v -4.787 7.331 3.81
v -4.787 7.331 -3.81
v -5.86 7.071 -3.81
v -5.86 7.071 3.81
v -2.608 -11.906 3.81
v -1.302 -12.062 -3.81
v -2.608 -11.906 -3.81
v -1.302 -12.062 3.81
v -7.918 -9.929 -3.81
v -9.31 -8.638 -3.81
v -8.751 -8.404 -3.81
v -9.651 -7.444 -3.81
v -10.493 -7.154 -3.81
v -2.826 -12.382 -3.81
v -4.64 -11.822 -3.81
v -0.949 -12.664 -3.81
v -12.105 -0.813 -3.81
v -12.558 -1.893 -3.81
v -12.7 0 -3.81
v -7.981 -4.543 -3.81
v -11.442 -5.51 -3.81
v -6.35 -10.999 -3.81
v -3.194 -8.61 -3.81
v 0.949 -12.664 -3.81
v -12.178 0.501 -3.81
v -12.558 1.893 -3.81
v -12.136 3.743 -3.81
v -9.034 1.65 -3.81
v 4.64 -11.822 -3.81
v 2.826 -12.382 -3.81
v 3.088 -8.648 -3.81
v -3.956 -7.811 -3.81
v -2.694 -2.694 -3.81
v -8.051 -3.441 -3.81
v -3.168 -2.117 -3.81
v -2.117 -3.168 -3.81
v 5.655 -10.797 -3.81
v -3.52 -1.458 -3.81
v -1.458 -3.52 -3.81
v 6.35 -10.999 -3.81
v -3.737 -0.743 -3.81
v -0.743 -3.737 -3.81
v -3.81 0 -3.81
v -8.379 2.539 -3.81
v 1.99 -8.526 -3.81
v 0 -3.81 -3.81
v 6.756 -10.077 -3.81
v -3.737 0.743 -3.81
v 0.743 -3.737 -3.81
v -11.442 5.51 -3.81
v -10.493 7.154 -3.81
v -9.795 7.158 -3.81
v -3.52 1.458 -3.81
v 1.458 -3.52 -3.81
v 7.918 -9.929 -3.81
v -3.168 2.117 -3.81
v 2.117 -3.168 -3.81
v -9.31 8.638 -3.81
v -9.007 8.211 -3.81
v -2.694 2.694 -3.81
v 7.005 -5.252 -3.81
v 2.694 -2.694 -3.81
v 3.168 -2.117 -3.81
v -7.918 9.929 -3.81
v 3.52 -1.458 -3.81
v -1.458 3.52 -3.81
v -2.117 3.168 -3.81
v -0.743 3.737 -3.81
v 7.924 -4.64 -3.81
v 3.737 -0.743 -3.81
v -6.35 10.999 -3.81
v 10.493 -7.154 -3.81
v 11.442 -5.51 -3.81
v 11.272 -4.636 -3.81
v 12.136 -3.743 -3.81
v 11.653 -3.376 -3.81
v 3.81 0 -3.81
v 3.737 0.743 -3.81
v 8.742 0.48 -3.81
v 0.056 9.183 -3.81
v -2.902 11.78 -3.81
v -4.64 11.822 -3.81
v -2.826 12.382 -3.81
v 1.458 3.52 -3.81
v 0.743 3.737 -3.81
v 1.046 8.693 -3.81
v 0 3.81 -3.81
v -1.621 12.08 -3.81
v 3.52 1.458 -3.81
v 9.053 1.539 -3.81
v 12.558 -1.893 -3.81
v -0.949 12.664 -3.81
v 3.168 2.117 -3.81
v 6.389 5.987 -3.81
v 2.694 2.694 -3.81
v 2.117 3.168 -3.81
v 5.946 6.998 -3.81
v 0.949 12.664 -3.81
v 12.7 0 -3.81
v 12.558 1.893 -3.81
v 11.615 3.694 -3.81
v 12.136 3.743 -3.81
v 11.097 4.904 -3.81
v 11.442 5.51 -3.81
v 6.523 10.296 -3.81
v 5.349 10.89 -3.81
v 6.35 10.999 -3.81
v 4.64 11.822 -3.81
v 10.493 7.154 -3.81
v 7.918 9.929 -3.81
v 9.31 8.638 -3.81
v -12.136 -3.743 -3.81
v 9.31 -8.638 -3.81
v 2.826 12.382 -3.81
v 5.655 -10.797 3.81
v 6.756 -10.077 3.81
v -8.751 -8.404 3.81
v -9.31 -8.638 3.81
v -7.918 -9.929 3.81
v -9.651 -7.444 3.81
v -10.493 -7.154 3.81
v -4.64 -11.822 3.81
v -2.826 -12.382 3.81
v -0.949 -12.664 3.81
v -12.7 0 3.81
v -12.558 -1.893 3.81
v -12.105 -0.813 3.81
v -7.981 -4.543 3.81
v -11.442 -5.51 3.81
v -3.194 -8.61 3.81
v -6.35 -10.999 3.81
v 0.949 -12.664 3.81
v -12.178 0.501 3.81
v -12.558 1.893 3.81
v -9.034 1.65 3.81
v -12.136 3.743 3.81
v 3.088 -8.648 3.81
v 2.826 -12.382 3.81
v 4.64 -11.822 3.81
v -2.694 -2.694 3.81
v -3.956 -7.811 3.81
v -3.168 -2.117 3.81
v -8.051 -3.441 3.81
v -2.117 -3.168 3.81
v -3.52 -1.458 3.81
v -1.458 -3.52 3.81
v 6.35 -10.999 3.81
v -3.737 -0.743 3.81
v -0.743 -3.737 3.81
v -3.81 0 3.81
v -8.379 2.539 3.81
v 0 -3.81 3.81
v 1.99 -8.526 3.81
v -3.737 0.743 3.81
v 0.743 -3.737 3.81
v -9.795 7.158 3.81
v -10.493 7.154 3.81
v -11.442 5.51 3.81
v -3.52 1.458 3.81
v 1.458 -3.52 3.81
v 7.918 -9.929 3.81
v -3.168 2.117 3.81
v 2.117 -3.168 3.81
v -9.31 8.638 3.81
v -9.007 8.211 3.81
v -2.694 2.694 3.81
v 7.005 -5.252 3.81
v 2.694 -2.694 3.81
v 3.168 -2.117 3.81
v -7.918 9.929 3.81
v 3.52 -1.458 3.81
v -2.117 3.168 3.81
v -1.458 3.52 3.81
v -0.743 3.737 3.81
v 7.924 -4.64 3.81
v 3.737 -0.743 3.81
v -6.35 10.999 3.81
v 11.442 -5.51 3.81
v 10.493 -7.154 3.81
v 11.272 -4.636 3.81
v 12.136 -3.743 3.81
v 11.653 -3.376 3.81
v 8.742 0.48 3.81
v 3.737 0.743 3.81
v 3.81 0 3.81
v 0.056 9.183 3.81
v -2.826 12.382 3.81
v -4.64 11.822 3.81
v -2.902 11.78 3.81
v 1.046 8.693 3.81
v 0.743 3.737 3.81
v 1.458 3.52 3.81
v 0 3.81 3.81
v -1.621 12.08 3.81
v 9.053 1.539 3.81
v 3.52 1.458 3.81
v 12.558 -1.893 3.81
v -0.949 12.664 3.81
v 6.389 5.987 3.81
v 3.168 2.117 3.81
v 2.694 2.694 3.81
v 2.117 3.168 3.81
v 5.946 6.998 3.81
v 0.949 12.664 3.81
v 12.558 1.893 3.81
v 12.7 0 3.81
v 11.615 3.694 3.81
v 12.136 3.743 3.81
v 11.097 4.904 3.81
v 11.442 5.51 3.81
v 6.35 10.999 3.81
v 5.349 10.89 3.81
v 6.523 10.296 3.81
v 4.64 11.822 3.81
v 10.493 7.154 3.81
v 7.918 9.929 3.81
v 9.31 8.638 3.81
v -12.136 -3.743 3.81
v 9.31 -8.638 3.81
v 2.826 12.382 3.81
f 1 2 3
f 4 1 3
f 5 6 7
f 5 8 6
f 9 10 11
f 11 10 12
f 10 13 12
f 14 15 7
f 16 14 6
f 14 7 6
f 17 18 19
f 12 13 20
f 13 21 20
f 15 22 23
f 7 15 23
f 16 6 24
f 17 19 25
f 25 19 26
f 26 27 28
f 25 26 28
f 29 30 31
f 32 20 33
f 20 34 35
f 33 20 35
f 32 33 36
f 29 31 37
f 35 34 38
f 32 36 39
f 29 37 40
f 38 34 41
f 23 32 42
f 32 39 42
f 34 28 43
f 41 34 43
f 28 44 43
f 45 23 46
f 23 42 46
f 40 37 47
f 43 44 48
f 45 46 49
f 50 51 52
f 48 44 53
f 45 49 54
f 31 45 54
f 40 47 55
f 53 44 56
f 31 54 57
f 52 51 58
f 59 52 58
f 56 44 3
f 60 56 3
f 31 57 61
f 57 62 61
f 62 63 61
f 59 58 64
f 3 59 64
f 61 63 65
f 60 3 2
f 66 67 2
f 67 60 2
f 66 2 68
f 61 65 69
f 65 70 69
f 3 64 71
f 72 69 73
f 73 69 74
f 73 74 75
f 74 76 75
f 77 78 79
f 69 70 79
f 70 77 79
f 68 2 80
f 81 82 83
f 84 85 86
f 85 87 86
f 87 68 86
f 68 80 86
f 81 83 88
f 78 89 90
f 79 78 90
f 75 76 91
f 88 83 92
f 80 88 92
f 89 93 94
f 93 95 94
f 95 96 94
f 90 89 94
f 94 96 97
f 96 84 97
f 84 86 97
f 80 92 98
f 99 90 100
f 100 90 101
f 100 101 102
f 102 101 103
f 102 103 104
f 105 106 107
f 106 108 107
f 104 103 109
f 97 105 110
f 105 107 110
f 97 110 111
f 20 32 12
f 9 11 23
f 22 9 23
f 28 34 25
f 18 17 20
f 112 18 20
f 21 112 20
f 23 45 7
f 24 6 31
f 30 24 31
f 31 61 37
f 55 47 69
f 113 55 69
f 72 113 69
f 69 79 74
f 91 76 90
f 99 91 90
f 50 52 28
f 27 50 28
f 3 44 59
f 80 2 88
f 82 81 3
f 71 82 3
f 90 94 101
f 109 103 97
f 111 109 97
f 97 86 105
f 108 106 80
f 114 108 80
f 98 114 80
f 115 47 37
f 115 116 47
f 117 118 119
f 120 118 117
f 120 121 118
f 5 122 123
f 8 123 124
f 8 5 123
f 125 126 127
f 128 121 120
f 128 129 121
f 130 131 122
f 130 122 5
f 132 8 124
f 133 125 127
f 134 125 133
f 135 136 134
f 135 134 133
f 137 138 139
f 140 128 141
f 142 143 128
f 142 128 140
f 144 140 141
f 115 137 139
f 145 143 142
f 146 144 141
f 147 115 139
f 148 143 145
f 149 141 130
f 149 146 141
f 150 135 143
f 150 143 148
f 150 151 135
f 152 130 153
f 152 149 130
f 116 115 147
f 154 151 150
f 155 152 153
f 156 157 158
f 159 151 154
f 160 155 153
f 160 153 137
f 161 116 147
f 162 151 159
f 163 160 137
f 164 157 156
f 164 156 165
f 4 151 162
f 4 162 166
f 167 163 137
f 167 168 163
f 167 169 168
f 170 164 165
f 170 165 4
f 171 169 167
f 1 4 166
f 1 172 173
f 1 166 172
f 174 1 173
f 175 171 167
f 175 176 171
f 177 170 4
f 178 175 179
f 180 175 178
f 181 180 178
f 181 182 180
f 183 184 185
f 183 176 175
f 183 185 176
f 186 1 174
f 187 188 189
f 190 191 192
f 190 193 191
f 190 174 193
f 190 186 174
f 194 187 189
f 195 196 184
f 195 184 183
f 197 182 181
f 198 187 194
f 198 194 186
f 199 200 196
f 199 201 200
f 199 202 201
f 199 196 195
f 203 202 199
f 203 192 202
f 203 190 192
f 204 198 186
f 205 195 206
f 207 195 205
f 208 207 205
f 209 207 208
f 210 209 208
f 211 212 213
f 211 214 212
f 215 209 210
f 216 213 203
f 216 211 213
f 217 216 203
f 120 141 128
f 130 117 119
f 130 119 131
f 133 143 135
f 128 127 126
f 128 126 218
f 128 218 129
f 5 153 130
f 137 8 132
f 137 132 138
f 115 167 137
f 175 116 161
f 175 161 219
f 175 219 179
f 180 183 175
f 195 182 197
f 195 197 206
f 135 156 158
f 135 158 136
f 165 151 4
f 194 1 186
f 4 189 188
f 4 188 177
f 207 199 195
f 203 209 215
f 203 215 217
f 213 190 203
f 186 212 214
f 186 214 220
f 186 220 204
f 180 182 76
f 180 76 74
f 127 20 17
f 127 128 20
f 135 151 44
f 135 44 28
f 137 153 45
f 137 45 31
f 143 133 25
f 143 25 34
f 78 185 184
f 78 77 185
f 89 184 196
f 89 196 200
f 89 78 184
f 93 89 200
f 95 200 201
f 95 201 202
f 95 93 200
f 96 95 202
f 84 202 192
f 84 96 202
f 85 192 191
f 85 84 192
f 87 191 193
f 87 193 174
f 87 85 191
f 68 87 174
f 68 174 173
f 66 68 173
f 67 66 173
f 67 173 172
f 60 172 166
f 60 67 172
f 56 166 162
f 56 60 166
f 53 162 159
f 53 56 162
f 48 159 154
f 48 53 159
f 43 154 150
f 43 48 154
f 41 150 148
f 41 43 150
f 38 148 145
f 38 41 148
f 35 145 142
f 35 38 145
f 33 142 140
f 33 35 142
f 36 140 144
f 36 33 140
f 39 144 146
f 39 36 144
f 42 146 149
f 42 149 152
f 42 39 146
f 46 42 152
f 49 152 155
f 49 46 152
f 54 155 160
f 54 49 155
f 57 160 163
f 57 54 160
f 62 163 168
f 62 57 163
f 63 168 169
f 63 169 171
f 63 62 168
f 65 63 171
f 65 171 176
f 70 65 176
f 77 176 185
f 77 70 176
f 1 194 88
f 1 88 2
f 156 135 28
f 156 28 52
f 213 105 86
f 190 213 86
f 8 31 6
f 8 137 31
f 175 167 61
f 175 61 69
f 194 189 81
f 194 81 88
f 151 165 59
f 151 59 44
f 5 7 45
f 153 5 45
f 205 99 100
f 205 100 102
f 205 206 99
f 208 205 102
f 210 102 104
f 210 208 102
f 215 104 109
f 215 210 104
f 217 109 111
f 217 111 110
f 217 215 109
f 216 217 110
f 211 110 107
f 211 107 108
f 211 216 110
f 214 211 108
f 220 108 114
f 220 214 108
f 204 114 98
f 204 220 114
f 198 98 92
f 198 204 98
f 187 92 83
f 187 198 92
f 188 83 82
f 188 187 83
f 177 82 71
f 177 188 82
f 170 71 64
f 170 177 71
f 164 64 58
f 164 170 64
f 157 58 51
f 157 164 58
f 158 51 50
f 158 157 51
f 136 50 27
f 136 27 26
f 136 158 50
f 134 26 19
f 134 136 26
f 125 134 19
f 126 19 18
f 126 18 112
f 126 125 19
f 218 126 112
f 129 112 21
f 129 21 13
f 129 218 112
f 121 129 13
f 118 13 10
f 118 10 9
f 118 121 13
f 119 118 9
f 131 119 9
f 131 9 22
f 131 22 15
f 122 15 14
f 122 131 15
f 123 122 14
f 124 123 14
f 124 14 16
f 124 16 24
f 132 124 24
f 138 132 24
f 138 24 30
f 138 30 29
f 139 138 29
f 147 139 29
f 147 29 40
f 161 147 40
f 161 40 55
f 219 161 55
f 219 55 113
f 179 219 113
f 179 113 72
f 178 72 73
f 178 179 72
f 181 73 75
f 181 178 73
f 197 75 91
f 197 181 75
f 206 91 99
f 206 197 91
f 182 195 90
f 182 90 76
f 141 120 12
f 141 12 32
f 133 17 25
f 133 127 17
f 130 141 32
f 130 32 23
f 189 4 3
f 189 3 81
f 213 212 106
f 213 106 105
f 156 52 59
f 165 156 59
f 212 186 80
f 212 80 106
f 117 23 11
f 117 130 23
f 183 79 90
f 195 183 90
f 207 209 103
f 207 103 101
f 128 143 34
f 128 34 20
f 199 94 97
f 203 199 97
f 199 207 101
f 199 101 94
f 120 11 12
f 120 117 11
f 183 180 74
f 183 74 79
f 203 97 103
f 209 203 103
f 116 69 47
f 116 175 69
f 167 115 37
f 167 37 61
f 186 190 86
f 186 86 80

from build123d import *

# Parameters (mm, degrees)
F0_R     = 12.7
F0_R_2   = 3.81
F1_DEPTH = 3.81


with BuildPart() as f1:
    # F0 (on Top) → F1 (new body, symmetric)
    with BuildSketch(Plane.XY):
        Circle(F0_R)
        Polygon((-9.650616, -7.443798), (-3.955839, -7.81104), (-3.193578, -8.609821), (-8.750626, -8.403624), align=None, mode=Mode.SUBTRACT)
        Polygon((-12.177582, 0.501016), (-8.051188, -3.44084), (-7.980709, -4.542713), (-12.105114, -0.812755), align=None, mode=Mode.SUBTRACT)
        Circle(F0_R_2, mode=Mode.SUBTRACT)
        Polygon((-2.608019, -11.905577), (1.990491, -8.526368), (3.087863, -8.648298), (-1.301624, -12.062344), align=None, mode=Mode.SUBTRACT)
        Polygon((5.654898, -10.796603), (7.005449, -5.252114), (7.924459, -4.64014), (6.756424, -10.076959), align=None, mode=Mode.SUBTRACT)
        Polygon((11.271826, -4.635779), (8.742479, 0.479663), (9.053113, 1.539191), (11.653065, -3.376453), align=None, mode=Mode.SUBTRACT)
        Polygon((-9.033578, 1.649981), (-9.795484, 7.158411), (-9.006522, 8.211399), (-8.379297, 2.539368), align=None, mode=Mode.SUBTRACT)
        Polygon((-1.62121, 12.079578), (-4.78664, 7.331377), (-5.859535, 7.07063), (-2.902438, 11.780077), align=None, mode=Mode.SUBTRACT)
        Polygon((11.614542, 3.694177), (6.388806, 5.987), (5.945714, 6.998317), (11.097108, 4.903933), align=None, mode=Mode.SUBTRACT)
        Polygon((6.522684, 10.295587), (1.04574, 8.692953), (0.05625, 9.182853), (5.348691, 10.889714), align=None, mode=Mode.SUBTRACT)
    extrude(amount=F1_DEPTH, both=True)


solid = f1.part
